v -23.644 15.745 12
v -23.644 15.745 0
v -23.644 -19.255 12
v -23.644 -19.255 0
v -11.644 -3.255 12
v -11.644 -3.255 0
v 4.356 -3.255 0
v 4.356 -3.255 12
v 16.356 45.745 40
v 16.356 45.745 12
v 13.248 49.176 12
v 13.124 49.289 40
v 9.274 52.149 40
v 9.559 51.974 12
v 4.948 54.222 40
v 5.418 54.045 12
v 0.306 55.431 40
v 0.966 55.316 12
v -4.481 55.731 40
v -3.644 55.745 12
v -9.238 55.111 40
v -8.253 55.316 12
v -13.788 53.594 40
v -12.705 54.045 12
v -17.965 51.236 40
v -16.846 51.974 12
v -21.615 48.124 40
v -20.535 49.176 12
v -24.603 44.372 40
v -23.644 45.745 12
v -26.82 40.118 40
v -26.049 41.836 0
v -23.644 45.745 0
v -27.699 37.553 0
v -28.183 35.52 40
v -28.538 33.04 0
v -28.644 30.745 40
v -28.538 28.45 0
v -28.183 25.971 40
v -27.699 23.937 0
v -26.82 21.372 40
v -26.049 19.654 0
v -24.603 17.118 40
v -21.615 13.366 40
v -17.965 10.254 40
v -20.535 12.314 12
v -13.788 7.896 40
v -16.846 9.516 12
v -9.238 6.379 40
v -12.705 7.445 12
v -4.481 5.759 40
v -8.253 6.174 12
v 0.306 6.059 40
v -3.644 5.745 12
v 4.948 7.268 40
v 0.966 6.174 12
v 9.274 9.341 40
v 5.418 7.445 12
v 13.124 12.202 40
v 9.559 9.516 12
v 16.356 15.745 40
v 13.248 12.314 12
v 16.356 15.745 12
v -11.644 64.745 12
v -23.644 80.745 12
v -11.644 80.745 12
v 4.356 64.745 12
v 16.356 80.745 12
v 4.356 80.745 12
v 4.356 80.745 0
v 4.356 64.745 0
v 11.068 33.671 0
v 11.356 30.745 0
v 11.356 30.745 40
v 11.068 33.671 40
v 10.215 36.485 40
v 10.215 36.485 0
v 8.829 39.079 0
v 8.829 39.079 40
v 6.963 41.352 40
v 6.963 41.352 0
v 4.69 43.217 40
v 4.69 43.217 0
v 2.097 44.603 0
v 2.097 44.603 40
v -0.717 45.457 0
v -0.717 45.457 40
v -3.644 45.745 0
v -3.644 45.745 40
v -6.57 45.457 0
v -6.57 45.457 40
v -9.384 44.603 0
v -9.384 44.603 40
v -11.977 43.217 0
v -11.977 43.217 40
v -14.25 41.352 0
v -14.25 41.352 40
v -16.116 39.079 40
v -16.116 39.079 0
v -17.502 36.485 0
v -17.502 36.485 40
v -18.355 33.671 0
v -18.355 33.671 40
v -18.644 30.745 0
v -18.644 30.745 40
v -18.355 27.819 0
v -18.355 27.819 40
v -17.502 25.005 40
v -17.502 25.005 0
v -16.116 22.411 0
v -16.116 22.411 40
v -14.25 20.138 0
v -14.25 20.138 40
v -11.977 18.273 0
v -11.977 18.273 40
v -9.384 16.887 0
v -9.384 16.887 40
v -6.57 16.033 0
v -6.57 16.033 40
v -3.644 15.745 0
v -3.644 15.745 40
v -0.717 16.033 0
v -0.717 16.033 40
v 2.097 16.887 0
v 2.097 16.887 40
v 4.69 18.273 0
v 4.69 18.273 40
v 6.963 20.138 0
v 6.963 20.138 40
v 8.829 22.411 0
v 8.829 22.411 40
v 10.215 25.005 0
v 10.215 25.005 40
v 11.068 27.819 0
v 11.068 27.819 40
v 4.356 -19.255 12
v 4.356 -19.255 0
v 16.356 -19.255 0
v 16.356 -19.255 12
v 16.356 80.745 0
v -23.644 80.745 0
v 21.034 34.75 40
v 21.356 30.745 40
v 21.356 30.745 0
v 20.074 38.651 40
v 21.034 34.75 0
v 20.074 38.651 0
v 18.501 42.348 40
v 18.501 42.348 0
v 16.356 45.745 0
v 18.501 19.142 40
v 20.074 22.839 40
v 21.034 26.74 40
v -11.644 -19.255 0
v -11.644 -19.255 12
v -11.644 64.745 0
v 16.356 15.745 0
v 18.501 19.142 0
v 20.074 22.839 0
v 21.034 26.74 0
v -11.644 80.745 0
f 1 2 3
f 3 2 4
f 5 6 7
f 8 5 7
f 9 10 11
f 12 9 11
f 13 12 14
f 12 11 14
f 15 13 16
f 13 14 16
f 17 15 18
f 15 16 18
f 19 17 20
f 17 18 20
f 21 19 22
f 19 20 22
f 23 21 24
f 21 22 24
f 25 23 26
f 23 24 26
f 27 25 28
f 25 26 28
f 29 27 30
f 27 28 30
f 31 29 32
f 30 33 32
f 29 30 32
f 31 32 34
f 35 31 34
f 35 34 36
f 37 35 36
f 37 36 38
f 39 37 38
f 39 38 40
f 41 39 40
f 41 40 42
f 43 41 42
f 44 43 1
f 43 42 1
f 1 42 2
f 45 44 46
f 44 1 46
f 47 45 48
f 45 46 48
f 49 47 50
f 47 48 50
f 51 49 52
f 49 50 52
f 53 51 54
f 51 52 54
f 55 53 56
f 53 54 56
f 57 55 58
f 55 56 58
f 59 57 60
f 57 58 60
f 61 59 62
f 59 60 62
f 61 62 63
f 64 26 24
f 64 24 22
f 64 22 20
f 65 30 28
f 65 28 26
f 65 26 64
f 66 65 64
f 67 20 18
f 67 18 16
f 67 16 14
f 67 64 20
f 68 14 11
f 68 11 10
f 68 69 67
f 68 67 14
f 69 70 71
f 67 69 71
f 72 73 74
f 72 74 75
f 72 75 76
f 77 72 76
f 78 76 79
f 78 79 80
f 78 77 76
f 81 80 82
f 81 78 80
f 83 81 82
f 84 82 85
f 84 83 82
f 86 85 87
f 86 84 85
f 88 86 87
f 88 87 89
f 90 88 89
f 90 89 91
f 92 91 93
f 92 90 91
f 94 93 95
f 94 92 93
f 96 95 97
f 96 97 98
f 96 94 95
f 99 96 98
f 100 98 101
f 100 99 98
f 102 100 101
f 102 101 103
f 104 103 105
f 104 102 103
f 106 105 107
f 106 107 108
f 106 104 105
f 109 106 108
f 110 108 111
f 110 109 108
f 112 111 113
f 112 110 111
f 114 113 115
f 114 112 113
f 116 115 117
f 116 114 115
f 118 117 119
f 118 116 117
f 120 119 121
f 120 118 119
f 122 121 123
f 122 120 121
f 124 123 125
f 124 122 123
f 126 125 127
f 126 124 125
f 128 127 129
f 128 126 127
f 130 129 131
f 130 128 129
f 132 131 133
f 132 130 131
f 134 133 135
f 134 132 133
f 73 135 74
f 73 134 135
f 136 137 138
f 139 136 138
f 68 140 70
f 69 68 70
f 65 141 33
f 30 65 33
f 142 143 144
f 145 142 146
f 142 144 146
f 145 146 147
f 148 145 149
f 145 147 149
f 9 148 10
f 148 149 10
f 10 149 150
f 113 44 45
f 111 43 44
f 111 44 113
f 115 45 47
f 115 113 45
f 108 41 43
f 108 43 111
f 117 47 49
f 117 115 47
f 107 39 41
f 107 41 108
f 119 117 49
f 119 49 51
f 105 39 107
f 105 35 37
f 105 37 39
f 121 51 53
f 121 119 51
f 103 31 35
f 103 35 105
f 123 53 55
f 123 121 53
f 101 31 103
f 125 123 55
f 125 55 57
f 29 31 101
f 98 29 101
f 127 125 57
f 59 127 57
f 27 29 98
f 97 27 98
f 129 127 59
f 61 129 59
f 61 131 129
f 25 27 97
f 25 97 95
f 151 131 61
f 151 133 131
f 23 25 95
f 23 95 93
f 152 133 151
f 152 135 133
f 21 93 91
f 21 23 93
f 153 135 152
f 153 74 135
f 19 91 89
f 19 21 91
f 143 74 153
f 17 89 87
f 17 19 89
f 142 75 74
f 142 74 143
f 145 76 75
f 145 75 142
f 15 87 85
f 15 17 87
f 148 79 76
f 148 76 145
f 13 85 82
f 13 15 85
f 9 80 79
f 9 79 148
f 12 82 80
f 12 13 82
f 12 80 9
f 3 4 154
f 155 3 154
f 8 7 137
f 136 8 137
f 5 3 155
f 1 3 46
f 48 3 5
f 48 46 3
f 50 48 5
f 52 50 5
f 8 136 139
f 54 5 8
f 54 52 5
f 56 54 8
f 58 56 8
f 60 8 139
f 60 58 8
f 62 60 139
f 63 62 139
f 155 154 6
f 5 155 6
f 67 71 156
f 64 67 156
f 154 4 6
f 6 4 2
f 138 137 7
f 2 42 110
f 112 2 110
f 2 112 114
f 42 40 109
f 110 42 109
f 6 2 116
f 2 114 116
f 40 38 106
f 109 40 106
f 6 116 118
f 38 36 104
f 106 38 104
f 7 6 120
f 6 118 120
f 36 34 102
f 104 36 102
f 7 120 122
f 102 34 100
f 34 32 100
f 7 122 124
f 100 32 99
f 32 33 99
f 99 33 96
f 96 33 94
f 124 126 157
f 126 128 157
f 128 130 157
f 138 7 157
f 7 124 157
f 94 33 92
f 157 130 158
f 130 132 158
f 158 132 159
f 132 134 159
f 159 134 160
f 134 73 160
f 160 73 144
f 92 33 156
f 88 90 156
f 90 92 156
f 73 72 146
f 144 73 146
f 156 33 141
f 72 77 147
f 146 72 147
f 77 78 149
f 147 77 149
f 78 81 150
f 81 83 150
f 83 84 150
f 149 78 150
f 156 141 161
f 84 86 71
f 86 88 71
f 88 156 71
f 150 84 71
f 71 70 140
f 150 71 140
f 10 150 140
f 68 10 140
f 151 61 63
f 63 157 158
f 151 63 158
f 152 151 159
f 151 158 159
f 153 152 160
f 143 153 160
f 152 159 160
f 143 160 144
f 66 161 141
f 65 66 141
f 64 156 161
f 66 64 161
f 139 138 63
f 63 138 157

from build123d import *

# Parameters (mm, degrees)
F0_R     = 15
F1_DEPTH = 40
F2_DEPTH = 12


with BuildPart() as f1:
    # F0 (on Top) → F1 (new body)
    with BuildSketch(Plane.XY):
        with BuildLine():
            ThreePointArc((-23.643522, 45.745022), (-28.643522, 30.745022), (-23.643522, 15.745022))
            ThreePointArc((-23.643522, 15.745022), (-3.643522, 5.745022), (16.356478, 15.745022))
            ThreePointArc((16.356478, 15.745022), (20.07356, 22.839328), (21.356478, 30.745022))
            ThreePointArc((21.356478, 30.745022), (20.07356, 38.650717), (16.356478, 45.745022))
            ThreePointArc((16.356478, 45.745022), (-3.643522, 55.745022), (-23.643522, 45.745022))
        make_face()
        with Locations((-3.643522, 30.745022)):
            Circle(F0_R, mode=Mode.SUBTRACT)
    extrude(amount=F1_DEPTH)

    # F0 (on Top) → F2 (join)
    with BuildSketch(Plane.XY):
        with BuildLine():
            Line((-23.643522, 15.745022), (-23.643522, -19.254978))
            Line((-23.643522, -19.254978), (-11.643522, -19.254978))
            Line((-11.643522, -19.254978), (-11.643522, -3.254978))
            Line((-11.643522, -3.254978), (4.356478, -3.254978))
            Line((4.356478, -3.254978), (4.356478, -19.254978))
            Line((4.356478, -19.254978), (16.356478, -19.254978))
            Line((16.356478, -19.254978), (16.356478, 15.745022))
            ThreePointArc((16.356478, 15.745022), (-3.643522, 5.745022), (-23.643522, 15.745022))
        make_face()
        with BuildLine():
            Line((-23.643522, 80.745022), (-23.643522, 45.745022))
            ThreePointArc((-23.643522, 45.745022), (-3.643522, 55.745022), (16.356478, 45.745022))
            Line((16.356478, 45.745022), (16.356478, 80.745022))
            Line((16.356478, 80.745022), (4.356478, 80.745022))
            Line((4.356478, 80.745022), (4.356478, 64.745022))
            Line((4.356478, 64.745022), (-11.643522, 64.745022))
            Line((-11.643522, 64.745022), (-11.643522, 80.745022))
            Line((-11.643522, 80.745022), (-23.643522, 80.745022))
        make_face()
    extrude(amount=F2_DEPTH)


solid = f1.part
